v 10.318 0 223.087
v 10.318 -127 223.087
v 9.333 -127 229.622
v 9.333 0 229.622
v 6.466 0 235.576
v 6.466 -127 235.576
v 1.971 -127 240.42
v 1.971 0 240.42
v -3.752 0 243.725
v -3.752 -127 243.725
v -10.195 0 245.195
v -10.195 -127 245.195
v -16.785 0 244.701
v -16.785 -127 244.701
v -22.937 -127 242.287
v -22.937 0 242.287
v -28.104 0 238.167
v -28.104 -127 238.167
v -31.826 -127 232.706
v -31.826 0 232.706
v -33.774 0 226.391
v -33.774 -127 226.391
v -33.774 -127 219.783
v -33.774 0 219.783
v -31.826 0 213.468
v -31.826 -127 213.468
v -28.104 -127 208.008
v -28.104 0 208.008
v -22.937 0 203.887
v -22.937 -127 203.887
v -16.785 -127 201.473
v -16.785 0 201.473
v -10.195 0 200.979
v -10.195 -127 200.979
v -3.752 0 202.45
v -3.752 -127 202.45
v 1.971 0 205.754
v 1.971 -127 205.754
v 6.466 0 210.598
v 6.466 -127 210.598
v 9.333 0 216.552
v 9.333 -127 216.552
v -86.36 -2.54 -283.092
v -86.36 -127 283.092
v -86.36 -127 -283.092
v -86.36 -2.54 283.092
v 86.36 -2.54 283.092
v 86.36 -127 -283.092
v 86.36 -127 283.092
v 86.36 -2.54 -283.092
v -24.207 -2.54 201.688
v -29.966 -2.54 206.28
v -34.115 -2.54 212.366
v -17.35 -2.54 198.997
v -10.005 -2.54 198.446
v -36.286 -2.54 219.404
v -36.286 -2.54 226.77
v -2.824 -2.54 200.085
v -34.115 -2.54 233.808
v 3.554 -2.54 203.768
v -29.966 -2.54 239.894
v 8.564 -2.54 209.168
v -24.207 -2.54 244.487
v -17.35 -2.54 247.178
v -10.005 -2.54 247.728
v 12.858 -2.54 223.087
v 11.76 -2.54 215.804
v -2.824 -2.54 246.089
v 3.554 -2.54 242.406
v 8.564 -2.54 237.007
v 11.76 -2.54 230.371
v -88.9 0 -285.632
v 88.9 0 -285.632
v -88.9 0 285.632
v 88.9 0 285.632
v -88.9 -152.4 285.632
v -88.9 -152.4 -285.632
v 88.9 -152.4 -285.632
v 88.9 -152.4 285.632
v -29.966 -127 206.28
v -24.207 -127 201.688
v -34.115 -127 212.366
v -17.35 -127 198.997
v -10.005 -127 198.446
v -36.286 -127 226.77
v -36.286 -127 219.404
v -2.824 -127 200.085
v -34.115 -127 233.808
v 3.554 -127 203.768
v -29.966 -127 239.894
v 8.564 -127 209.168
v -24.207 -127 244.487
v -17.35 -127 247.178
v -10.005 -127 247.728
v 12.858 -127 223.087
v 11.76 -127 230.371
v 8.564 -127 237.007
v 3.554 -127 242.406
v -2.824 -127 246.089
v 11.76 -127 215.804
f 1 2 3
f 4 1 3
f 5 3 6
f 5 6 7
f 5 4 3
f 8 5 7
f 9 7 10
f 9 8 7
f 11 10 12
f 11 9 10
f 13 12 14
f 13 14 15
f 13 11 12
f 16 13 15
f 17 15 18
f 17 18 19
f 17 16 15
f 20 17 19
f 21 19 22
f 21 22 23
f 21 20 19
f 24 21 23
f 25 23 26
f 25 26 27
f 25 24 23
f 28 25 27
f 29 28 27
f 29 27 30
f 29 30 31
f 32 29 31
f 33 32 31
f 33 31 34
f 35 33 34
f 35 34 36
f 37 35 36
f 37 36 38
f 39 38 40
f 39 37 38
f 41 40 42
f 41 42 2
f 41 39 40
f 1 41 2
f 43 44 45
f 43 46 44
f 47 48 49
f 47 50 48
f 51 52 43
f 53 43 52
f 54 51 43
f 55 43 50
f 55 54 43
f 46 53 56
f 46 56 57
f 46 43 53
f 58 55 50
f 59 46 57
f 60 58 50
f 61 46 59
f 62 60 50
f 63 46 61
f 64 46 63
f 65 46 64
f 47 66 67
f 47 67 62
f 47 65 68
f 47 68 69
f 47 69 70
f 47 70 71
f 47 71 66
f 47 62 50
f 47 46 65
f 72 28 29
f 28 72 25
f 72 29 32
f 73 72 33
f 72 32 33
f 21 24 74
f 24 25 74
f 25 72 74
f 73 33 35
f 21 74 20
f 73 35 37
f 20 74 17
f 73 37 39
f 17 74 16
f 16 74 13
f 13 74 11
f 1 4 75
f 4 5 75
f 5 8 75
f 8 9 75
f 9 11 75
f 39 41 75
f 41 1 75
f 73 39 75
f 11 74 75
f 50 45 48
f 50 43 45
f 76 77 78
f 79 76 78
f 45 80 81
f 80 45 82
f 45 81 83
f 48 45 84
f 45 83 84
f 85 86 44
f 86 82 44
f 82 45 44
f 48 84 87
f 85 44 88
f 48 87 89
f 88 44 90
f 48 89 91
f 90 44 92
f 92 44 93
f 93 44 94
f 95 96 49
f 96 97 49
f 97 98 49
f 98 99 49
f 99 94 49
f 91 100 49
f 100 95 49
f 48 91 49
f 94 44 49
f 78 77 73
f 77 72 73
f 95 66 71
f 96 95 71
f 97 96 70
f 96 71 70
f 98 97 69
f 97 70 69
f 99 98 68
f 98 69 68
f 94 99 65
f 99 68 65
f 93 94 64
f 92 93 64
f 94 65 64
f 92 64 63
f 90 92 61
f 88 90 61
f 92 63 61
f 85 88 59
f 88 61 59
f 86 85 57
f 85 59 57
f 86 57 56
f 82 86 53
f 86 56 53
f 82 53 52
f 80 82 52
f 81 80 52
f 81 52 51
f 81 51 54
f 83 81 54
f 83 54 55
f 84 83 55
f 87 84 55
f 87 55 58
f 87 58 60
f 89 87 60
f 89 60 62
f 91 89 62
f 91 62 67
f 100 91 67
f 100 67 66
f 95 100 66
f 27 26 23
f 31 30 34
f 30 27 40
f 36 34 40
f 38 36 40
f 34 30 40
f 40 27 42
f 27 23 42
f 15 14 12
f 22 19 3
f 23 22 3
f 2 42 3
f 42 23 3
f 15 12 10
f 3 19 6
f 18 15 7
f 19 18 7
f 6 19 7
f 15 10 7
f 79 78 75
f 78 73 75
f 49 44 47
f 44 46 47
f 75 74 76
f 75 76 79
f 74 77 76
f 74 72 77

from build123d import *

# Parameters (mm, degrees)
F0_W     = 177.8
F0_H     = 140.06032
F0_R     = 22.169978
F0_H_2   = 431.204602
F1_DEPTH = 127
F2_T     = -2.54
F3_W     = 177.8
F3_H     = 571.264922
F4_DEPTH = 25.4


with BuildPart() as f1:
    # F0 (on Front) → F1 (new body)
    with BuildSketch(Plane.XZ):
        with Locations((0, 215.602301)):
            Rectangle(F0_W, F0_H)
        with Locations((-11.851988, 223.087162)):
            Circle(F0_R, mode=Mode.SUBTRACT)
        with Locations((0, -70.03016)):
            Rectangle(F0_W, F0_H_2)
    extrude(amount=F1_DEPTH)

    # F2
    f2_openings = [f1.faces().sort_by_distance(p)[0] for p in [
        (0.18296, -127, -3.443806),
    ]]
    offset(amount=F2_T, openings=f2_openings)

    # F3 (on face) → F4 (join)
    with BuildSketch(Plane.XZ.offset(127)):
        Rectangle(F3_W, F3_H)
    extrude(amount=F4_DEPTH)


solid = f1.part
